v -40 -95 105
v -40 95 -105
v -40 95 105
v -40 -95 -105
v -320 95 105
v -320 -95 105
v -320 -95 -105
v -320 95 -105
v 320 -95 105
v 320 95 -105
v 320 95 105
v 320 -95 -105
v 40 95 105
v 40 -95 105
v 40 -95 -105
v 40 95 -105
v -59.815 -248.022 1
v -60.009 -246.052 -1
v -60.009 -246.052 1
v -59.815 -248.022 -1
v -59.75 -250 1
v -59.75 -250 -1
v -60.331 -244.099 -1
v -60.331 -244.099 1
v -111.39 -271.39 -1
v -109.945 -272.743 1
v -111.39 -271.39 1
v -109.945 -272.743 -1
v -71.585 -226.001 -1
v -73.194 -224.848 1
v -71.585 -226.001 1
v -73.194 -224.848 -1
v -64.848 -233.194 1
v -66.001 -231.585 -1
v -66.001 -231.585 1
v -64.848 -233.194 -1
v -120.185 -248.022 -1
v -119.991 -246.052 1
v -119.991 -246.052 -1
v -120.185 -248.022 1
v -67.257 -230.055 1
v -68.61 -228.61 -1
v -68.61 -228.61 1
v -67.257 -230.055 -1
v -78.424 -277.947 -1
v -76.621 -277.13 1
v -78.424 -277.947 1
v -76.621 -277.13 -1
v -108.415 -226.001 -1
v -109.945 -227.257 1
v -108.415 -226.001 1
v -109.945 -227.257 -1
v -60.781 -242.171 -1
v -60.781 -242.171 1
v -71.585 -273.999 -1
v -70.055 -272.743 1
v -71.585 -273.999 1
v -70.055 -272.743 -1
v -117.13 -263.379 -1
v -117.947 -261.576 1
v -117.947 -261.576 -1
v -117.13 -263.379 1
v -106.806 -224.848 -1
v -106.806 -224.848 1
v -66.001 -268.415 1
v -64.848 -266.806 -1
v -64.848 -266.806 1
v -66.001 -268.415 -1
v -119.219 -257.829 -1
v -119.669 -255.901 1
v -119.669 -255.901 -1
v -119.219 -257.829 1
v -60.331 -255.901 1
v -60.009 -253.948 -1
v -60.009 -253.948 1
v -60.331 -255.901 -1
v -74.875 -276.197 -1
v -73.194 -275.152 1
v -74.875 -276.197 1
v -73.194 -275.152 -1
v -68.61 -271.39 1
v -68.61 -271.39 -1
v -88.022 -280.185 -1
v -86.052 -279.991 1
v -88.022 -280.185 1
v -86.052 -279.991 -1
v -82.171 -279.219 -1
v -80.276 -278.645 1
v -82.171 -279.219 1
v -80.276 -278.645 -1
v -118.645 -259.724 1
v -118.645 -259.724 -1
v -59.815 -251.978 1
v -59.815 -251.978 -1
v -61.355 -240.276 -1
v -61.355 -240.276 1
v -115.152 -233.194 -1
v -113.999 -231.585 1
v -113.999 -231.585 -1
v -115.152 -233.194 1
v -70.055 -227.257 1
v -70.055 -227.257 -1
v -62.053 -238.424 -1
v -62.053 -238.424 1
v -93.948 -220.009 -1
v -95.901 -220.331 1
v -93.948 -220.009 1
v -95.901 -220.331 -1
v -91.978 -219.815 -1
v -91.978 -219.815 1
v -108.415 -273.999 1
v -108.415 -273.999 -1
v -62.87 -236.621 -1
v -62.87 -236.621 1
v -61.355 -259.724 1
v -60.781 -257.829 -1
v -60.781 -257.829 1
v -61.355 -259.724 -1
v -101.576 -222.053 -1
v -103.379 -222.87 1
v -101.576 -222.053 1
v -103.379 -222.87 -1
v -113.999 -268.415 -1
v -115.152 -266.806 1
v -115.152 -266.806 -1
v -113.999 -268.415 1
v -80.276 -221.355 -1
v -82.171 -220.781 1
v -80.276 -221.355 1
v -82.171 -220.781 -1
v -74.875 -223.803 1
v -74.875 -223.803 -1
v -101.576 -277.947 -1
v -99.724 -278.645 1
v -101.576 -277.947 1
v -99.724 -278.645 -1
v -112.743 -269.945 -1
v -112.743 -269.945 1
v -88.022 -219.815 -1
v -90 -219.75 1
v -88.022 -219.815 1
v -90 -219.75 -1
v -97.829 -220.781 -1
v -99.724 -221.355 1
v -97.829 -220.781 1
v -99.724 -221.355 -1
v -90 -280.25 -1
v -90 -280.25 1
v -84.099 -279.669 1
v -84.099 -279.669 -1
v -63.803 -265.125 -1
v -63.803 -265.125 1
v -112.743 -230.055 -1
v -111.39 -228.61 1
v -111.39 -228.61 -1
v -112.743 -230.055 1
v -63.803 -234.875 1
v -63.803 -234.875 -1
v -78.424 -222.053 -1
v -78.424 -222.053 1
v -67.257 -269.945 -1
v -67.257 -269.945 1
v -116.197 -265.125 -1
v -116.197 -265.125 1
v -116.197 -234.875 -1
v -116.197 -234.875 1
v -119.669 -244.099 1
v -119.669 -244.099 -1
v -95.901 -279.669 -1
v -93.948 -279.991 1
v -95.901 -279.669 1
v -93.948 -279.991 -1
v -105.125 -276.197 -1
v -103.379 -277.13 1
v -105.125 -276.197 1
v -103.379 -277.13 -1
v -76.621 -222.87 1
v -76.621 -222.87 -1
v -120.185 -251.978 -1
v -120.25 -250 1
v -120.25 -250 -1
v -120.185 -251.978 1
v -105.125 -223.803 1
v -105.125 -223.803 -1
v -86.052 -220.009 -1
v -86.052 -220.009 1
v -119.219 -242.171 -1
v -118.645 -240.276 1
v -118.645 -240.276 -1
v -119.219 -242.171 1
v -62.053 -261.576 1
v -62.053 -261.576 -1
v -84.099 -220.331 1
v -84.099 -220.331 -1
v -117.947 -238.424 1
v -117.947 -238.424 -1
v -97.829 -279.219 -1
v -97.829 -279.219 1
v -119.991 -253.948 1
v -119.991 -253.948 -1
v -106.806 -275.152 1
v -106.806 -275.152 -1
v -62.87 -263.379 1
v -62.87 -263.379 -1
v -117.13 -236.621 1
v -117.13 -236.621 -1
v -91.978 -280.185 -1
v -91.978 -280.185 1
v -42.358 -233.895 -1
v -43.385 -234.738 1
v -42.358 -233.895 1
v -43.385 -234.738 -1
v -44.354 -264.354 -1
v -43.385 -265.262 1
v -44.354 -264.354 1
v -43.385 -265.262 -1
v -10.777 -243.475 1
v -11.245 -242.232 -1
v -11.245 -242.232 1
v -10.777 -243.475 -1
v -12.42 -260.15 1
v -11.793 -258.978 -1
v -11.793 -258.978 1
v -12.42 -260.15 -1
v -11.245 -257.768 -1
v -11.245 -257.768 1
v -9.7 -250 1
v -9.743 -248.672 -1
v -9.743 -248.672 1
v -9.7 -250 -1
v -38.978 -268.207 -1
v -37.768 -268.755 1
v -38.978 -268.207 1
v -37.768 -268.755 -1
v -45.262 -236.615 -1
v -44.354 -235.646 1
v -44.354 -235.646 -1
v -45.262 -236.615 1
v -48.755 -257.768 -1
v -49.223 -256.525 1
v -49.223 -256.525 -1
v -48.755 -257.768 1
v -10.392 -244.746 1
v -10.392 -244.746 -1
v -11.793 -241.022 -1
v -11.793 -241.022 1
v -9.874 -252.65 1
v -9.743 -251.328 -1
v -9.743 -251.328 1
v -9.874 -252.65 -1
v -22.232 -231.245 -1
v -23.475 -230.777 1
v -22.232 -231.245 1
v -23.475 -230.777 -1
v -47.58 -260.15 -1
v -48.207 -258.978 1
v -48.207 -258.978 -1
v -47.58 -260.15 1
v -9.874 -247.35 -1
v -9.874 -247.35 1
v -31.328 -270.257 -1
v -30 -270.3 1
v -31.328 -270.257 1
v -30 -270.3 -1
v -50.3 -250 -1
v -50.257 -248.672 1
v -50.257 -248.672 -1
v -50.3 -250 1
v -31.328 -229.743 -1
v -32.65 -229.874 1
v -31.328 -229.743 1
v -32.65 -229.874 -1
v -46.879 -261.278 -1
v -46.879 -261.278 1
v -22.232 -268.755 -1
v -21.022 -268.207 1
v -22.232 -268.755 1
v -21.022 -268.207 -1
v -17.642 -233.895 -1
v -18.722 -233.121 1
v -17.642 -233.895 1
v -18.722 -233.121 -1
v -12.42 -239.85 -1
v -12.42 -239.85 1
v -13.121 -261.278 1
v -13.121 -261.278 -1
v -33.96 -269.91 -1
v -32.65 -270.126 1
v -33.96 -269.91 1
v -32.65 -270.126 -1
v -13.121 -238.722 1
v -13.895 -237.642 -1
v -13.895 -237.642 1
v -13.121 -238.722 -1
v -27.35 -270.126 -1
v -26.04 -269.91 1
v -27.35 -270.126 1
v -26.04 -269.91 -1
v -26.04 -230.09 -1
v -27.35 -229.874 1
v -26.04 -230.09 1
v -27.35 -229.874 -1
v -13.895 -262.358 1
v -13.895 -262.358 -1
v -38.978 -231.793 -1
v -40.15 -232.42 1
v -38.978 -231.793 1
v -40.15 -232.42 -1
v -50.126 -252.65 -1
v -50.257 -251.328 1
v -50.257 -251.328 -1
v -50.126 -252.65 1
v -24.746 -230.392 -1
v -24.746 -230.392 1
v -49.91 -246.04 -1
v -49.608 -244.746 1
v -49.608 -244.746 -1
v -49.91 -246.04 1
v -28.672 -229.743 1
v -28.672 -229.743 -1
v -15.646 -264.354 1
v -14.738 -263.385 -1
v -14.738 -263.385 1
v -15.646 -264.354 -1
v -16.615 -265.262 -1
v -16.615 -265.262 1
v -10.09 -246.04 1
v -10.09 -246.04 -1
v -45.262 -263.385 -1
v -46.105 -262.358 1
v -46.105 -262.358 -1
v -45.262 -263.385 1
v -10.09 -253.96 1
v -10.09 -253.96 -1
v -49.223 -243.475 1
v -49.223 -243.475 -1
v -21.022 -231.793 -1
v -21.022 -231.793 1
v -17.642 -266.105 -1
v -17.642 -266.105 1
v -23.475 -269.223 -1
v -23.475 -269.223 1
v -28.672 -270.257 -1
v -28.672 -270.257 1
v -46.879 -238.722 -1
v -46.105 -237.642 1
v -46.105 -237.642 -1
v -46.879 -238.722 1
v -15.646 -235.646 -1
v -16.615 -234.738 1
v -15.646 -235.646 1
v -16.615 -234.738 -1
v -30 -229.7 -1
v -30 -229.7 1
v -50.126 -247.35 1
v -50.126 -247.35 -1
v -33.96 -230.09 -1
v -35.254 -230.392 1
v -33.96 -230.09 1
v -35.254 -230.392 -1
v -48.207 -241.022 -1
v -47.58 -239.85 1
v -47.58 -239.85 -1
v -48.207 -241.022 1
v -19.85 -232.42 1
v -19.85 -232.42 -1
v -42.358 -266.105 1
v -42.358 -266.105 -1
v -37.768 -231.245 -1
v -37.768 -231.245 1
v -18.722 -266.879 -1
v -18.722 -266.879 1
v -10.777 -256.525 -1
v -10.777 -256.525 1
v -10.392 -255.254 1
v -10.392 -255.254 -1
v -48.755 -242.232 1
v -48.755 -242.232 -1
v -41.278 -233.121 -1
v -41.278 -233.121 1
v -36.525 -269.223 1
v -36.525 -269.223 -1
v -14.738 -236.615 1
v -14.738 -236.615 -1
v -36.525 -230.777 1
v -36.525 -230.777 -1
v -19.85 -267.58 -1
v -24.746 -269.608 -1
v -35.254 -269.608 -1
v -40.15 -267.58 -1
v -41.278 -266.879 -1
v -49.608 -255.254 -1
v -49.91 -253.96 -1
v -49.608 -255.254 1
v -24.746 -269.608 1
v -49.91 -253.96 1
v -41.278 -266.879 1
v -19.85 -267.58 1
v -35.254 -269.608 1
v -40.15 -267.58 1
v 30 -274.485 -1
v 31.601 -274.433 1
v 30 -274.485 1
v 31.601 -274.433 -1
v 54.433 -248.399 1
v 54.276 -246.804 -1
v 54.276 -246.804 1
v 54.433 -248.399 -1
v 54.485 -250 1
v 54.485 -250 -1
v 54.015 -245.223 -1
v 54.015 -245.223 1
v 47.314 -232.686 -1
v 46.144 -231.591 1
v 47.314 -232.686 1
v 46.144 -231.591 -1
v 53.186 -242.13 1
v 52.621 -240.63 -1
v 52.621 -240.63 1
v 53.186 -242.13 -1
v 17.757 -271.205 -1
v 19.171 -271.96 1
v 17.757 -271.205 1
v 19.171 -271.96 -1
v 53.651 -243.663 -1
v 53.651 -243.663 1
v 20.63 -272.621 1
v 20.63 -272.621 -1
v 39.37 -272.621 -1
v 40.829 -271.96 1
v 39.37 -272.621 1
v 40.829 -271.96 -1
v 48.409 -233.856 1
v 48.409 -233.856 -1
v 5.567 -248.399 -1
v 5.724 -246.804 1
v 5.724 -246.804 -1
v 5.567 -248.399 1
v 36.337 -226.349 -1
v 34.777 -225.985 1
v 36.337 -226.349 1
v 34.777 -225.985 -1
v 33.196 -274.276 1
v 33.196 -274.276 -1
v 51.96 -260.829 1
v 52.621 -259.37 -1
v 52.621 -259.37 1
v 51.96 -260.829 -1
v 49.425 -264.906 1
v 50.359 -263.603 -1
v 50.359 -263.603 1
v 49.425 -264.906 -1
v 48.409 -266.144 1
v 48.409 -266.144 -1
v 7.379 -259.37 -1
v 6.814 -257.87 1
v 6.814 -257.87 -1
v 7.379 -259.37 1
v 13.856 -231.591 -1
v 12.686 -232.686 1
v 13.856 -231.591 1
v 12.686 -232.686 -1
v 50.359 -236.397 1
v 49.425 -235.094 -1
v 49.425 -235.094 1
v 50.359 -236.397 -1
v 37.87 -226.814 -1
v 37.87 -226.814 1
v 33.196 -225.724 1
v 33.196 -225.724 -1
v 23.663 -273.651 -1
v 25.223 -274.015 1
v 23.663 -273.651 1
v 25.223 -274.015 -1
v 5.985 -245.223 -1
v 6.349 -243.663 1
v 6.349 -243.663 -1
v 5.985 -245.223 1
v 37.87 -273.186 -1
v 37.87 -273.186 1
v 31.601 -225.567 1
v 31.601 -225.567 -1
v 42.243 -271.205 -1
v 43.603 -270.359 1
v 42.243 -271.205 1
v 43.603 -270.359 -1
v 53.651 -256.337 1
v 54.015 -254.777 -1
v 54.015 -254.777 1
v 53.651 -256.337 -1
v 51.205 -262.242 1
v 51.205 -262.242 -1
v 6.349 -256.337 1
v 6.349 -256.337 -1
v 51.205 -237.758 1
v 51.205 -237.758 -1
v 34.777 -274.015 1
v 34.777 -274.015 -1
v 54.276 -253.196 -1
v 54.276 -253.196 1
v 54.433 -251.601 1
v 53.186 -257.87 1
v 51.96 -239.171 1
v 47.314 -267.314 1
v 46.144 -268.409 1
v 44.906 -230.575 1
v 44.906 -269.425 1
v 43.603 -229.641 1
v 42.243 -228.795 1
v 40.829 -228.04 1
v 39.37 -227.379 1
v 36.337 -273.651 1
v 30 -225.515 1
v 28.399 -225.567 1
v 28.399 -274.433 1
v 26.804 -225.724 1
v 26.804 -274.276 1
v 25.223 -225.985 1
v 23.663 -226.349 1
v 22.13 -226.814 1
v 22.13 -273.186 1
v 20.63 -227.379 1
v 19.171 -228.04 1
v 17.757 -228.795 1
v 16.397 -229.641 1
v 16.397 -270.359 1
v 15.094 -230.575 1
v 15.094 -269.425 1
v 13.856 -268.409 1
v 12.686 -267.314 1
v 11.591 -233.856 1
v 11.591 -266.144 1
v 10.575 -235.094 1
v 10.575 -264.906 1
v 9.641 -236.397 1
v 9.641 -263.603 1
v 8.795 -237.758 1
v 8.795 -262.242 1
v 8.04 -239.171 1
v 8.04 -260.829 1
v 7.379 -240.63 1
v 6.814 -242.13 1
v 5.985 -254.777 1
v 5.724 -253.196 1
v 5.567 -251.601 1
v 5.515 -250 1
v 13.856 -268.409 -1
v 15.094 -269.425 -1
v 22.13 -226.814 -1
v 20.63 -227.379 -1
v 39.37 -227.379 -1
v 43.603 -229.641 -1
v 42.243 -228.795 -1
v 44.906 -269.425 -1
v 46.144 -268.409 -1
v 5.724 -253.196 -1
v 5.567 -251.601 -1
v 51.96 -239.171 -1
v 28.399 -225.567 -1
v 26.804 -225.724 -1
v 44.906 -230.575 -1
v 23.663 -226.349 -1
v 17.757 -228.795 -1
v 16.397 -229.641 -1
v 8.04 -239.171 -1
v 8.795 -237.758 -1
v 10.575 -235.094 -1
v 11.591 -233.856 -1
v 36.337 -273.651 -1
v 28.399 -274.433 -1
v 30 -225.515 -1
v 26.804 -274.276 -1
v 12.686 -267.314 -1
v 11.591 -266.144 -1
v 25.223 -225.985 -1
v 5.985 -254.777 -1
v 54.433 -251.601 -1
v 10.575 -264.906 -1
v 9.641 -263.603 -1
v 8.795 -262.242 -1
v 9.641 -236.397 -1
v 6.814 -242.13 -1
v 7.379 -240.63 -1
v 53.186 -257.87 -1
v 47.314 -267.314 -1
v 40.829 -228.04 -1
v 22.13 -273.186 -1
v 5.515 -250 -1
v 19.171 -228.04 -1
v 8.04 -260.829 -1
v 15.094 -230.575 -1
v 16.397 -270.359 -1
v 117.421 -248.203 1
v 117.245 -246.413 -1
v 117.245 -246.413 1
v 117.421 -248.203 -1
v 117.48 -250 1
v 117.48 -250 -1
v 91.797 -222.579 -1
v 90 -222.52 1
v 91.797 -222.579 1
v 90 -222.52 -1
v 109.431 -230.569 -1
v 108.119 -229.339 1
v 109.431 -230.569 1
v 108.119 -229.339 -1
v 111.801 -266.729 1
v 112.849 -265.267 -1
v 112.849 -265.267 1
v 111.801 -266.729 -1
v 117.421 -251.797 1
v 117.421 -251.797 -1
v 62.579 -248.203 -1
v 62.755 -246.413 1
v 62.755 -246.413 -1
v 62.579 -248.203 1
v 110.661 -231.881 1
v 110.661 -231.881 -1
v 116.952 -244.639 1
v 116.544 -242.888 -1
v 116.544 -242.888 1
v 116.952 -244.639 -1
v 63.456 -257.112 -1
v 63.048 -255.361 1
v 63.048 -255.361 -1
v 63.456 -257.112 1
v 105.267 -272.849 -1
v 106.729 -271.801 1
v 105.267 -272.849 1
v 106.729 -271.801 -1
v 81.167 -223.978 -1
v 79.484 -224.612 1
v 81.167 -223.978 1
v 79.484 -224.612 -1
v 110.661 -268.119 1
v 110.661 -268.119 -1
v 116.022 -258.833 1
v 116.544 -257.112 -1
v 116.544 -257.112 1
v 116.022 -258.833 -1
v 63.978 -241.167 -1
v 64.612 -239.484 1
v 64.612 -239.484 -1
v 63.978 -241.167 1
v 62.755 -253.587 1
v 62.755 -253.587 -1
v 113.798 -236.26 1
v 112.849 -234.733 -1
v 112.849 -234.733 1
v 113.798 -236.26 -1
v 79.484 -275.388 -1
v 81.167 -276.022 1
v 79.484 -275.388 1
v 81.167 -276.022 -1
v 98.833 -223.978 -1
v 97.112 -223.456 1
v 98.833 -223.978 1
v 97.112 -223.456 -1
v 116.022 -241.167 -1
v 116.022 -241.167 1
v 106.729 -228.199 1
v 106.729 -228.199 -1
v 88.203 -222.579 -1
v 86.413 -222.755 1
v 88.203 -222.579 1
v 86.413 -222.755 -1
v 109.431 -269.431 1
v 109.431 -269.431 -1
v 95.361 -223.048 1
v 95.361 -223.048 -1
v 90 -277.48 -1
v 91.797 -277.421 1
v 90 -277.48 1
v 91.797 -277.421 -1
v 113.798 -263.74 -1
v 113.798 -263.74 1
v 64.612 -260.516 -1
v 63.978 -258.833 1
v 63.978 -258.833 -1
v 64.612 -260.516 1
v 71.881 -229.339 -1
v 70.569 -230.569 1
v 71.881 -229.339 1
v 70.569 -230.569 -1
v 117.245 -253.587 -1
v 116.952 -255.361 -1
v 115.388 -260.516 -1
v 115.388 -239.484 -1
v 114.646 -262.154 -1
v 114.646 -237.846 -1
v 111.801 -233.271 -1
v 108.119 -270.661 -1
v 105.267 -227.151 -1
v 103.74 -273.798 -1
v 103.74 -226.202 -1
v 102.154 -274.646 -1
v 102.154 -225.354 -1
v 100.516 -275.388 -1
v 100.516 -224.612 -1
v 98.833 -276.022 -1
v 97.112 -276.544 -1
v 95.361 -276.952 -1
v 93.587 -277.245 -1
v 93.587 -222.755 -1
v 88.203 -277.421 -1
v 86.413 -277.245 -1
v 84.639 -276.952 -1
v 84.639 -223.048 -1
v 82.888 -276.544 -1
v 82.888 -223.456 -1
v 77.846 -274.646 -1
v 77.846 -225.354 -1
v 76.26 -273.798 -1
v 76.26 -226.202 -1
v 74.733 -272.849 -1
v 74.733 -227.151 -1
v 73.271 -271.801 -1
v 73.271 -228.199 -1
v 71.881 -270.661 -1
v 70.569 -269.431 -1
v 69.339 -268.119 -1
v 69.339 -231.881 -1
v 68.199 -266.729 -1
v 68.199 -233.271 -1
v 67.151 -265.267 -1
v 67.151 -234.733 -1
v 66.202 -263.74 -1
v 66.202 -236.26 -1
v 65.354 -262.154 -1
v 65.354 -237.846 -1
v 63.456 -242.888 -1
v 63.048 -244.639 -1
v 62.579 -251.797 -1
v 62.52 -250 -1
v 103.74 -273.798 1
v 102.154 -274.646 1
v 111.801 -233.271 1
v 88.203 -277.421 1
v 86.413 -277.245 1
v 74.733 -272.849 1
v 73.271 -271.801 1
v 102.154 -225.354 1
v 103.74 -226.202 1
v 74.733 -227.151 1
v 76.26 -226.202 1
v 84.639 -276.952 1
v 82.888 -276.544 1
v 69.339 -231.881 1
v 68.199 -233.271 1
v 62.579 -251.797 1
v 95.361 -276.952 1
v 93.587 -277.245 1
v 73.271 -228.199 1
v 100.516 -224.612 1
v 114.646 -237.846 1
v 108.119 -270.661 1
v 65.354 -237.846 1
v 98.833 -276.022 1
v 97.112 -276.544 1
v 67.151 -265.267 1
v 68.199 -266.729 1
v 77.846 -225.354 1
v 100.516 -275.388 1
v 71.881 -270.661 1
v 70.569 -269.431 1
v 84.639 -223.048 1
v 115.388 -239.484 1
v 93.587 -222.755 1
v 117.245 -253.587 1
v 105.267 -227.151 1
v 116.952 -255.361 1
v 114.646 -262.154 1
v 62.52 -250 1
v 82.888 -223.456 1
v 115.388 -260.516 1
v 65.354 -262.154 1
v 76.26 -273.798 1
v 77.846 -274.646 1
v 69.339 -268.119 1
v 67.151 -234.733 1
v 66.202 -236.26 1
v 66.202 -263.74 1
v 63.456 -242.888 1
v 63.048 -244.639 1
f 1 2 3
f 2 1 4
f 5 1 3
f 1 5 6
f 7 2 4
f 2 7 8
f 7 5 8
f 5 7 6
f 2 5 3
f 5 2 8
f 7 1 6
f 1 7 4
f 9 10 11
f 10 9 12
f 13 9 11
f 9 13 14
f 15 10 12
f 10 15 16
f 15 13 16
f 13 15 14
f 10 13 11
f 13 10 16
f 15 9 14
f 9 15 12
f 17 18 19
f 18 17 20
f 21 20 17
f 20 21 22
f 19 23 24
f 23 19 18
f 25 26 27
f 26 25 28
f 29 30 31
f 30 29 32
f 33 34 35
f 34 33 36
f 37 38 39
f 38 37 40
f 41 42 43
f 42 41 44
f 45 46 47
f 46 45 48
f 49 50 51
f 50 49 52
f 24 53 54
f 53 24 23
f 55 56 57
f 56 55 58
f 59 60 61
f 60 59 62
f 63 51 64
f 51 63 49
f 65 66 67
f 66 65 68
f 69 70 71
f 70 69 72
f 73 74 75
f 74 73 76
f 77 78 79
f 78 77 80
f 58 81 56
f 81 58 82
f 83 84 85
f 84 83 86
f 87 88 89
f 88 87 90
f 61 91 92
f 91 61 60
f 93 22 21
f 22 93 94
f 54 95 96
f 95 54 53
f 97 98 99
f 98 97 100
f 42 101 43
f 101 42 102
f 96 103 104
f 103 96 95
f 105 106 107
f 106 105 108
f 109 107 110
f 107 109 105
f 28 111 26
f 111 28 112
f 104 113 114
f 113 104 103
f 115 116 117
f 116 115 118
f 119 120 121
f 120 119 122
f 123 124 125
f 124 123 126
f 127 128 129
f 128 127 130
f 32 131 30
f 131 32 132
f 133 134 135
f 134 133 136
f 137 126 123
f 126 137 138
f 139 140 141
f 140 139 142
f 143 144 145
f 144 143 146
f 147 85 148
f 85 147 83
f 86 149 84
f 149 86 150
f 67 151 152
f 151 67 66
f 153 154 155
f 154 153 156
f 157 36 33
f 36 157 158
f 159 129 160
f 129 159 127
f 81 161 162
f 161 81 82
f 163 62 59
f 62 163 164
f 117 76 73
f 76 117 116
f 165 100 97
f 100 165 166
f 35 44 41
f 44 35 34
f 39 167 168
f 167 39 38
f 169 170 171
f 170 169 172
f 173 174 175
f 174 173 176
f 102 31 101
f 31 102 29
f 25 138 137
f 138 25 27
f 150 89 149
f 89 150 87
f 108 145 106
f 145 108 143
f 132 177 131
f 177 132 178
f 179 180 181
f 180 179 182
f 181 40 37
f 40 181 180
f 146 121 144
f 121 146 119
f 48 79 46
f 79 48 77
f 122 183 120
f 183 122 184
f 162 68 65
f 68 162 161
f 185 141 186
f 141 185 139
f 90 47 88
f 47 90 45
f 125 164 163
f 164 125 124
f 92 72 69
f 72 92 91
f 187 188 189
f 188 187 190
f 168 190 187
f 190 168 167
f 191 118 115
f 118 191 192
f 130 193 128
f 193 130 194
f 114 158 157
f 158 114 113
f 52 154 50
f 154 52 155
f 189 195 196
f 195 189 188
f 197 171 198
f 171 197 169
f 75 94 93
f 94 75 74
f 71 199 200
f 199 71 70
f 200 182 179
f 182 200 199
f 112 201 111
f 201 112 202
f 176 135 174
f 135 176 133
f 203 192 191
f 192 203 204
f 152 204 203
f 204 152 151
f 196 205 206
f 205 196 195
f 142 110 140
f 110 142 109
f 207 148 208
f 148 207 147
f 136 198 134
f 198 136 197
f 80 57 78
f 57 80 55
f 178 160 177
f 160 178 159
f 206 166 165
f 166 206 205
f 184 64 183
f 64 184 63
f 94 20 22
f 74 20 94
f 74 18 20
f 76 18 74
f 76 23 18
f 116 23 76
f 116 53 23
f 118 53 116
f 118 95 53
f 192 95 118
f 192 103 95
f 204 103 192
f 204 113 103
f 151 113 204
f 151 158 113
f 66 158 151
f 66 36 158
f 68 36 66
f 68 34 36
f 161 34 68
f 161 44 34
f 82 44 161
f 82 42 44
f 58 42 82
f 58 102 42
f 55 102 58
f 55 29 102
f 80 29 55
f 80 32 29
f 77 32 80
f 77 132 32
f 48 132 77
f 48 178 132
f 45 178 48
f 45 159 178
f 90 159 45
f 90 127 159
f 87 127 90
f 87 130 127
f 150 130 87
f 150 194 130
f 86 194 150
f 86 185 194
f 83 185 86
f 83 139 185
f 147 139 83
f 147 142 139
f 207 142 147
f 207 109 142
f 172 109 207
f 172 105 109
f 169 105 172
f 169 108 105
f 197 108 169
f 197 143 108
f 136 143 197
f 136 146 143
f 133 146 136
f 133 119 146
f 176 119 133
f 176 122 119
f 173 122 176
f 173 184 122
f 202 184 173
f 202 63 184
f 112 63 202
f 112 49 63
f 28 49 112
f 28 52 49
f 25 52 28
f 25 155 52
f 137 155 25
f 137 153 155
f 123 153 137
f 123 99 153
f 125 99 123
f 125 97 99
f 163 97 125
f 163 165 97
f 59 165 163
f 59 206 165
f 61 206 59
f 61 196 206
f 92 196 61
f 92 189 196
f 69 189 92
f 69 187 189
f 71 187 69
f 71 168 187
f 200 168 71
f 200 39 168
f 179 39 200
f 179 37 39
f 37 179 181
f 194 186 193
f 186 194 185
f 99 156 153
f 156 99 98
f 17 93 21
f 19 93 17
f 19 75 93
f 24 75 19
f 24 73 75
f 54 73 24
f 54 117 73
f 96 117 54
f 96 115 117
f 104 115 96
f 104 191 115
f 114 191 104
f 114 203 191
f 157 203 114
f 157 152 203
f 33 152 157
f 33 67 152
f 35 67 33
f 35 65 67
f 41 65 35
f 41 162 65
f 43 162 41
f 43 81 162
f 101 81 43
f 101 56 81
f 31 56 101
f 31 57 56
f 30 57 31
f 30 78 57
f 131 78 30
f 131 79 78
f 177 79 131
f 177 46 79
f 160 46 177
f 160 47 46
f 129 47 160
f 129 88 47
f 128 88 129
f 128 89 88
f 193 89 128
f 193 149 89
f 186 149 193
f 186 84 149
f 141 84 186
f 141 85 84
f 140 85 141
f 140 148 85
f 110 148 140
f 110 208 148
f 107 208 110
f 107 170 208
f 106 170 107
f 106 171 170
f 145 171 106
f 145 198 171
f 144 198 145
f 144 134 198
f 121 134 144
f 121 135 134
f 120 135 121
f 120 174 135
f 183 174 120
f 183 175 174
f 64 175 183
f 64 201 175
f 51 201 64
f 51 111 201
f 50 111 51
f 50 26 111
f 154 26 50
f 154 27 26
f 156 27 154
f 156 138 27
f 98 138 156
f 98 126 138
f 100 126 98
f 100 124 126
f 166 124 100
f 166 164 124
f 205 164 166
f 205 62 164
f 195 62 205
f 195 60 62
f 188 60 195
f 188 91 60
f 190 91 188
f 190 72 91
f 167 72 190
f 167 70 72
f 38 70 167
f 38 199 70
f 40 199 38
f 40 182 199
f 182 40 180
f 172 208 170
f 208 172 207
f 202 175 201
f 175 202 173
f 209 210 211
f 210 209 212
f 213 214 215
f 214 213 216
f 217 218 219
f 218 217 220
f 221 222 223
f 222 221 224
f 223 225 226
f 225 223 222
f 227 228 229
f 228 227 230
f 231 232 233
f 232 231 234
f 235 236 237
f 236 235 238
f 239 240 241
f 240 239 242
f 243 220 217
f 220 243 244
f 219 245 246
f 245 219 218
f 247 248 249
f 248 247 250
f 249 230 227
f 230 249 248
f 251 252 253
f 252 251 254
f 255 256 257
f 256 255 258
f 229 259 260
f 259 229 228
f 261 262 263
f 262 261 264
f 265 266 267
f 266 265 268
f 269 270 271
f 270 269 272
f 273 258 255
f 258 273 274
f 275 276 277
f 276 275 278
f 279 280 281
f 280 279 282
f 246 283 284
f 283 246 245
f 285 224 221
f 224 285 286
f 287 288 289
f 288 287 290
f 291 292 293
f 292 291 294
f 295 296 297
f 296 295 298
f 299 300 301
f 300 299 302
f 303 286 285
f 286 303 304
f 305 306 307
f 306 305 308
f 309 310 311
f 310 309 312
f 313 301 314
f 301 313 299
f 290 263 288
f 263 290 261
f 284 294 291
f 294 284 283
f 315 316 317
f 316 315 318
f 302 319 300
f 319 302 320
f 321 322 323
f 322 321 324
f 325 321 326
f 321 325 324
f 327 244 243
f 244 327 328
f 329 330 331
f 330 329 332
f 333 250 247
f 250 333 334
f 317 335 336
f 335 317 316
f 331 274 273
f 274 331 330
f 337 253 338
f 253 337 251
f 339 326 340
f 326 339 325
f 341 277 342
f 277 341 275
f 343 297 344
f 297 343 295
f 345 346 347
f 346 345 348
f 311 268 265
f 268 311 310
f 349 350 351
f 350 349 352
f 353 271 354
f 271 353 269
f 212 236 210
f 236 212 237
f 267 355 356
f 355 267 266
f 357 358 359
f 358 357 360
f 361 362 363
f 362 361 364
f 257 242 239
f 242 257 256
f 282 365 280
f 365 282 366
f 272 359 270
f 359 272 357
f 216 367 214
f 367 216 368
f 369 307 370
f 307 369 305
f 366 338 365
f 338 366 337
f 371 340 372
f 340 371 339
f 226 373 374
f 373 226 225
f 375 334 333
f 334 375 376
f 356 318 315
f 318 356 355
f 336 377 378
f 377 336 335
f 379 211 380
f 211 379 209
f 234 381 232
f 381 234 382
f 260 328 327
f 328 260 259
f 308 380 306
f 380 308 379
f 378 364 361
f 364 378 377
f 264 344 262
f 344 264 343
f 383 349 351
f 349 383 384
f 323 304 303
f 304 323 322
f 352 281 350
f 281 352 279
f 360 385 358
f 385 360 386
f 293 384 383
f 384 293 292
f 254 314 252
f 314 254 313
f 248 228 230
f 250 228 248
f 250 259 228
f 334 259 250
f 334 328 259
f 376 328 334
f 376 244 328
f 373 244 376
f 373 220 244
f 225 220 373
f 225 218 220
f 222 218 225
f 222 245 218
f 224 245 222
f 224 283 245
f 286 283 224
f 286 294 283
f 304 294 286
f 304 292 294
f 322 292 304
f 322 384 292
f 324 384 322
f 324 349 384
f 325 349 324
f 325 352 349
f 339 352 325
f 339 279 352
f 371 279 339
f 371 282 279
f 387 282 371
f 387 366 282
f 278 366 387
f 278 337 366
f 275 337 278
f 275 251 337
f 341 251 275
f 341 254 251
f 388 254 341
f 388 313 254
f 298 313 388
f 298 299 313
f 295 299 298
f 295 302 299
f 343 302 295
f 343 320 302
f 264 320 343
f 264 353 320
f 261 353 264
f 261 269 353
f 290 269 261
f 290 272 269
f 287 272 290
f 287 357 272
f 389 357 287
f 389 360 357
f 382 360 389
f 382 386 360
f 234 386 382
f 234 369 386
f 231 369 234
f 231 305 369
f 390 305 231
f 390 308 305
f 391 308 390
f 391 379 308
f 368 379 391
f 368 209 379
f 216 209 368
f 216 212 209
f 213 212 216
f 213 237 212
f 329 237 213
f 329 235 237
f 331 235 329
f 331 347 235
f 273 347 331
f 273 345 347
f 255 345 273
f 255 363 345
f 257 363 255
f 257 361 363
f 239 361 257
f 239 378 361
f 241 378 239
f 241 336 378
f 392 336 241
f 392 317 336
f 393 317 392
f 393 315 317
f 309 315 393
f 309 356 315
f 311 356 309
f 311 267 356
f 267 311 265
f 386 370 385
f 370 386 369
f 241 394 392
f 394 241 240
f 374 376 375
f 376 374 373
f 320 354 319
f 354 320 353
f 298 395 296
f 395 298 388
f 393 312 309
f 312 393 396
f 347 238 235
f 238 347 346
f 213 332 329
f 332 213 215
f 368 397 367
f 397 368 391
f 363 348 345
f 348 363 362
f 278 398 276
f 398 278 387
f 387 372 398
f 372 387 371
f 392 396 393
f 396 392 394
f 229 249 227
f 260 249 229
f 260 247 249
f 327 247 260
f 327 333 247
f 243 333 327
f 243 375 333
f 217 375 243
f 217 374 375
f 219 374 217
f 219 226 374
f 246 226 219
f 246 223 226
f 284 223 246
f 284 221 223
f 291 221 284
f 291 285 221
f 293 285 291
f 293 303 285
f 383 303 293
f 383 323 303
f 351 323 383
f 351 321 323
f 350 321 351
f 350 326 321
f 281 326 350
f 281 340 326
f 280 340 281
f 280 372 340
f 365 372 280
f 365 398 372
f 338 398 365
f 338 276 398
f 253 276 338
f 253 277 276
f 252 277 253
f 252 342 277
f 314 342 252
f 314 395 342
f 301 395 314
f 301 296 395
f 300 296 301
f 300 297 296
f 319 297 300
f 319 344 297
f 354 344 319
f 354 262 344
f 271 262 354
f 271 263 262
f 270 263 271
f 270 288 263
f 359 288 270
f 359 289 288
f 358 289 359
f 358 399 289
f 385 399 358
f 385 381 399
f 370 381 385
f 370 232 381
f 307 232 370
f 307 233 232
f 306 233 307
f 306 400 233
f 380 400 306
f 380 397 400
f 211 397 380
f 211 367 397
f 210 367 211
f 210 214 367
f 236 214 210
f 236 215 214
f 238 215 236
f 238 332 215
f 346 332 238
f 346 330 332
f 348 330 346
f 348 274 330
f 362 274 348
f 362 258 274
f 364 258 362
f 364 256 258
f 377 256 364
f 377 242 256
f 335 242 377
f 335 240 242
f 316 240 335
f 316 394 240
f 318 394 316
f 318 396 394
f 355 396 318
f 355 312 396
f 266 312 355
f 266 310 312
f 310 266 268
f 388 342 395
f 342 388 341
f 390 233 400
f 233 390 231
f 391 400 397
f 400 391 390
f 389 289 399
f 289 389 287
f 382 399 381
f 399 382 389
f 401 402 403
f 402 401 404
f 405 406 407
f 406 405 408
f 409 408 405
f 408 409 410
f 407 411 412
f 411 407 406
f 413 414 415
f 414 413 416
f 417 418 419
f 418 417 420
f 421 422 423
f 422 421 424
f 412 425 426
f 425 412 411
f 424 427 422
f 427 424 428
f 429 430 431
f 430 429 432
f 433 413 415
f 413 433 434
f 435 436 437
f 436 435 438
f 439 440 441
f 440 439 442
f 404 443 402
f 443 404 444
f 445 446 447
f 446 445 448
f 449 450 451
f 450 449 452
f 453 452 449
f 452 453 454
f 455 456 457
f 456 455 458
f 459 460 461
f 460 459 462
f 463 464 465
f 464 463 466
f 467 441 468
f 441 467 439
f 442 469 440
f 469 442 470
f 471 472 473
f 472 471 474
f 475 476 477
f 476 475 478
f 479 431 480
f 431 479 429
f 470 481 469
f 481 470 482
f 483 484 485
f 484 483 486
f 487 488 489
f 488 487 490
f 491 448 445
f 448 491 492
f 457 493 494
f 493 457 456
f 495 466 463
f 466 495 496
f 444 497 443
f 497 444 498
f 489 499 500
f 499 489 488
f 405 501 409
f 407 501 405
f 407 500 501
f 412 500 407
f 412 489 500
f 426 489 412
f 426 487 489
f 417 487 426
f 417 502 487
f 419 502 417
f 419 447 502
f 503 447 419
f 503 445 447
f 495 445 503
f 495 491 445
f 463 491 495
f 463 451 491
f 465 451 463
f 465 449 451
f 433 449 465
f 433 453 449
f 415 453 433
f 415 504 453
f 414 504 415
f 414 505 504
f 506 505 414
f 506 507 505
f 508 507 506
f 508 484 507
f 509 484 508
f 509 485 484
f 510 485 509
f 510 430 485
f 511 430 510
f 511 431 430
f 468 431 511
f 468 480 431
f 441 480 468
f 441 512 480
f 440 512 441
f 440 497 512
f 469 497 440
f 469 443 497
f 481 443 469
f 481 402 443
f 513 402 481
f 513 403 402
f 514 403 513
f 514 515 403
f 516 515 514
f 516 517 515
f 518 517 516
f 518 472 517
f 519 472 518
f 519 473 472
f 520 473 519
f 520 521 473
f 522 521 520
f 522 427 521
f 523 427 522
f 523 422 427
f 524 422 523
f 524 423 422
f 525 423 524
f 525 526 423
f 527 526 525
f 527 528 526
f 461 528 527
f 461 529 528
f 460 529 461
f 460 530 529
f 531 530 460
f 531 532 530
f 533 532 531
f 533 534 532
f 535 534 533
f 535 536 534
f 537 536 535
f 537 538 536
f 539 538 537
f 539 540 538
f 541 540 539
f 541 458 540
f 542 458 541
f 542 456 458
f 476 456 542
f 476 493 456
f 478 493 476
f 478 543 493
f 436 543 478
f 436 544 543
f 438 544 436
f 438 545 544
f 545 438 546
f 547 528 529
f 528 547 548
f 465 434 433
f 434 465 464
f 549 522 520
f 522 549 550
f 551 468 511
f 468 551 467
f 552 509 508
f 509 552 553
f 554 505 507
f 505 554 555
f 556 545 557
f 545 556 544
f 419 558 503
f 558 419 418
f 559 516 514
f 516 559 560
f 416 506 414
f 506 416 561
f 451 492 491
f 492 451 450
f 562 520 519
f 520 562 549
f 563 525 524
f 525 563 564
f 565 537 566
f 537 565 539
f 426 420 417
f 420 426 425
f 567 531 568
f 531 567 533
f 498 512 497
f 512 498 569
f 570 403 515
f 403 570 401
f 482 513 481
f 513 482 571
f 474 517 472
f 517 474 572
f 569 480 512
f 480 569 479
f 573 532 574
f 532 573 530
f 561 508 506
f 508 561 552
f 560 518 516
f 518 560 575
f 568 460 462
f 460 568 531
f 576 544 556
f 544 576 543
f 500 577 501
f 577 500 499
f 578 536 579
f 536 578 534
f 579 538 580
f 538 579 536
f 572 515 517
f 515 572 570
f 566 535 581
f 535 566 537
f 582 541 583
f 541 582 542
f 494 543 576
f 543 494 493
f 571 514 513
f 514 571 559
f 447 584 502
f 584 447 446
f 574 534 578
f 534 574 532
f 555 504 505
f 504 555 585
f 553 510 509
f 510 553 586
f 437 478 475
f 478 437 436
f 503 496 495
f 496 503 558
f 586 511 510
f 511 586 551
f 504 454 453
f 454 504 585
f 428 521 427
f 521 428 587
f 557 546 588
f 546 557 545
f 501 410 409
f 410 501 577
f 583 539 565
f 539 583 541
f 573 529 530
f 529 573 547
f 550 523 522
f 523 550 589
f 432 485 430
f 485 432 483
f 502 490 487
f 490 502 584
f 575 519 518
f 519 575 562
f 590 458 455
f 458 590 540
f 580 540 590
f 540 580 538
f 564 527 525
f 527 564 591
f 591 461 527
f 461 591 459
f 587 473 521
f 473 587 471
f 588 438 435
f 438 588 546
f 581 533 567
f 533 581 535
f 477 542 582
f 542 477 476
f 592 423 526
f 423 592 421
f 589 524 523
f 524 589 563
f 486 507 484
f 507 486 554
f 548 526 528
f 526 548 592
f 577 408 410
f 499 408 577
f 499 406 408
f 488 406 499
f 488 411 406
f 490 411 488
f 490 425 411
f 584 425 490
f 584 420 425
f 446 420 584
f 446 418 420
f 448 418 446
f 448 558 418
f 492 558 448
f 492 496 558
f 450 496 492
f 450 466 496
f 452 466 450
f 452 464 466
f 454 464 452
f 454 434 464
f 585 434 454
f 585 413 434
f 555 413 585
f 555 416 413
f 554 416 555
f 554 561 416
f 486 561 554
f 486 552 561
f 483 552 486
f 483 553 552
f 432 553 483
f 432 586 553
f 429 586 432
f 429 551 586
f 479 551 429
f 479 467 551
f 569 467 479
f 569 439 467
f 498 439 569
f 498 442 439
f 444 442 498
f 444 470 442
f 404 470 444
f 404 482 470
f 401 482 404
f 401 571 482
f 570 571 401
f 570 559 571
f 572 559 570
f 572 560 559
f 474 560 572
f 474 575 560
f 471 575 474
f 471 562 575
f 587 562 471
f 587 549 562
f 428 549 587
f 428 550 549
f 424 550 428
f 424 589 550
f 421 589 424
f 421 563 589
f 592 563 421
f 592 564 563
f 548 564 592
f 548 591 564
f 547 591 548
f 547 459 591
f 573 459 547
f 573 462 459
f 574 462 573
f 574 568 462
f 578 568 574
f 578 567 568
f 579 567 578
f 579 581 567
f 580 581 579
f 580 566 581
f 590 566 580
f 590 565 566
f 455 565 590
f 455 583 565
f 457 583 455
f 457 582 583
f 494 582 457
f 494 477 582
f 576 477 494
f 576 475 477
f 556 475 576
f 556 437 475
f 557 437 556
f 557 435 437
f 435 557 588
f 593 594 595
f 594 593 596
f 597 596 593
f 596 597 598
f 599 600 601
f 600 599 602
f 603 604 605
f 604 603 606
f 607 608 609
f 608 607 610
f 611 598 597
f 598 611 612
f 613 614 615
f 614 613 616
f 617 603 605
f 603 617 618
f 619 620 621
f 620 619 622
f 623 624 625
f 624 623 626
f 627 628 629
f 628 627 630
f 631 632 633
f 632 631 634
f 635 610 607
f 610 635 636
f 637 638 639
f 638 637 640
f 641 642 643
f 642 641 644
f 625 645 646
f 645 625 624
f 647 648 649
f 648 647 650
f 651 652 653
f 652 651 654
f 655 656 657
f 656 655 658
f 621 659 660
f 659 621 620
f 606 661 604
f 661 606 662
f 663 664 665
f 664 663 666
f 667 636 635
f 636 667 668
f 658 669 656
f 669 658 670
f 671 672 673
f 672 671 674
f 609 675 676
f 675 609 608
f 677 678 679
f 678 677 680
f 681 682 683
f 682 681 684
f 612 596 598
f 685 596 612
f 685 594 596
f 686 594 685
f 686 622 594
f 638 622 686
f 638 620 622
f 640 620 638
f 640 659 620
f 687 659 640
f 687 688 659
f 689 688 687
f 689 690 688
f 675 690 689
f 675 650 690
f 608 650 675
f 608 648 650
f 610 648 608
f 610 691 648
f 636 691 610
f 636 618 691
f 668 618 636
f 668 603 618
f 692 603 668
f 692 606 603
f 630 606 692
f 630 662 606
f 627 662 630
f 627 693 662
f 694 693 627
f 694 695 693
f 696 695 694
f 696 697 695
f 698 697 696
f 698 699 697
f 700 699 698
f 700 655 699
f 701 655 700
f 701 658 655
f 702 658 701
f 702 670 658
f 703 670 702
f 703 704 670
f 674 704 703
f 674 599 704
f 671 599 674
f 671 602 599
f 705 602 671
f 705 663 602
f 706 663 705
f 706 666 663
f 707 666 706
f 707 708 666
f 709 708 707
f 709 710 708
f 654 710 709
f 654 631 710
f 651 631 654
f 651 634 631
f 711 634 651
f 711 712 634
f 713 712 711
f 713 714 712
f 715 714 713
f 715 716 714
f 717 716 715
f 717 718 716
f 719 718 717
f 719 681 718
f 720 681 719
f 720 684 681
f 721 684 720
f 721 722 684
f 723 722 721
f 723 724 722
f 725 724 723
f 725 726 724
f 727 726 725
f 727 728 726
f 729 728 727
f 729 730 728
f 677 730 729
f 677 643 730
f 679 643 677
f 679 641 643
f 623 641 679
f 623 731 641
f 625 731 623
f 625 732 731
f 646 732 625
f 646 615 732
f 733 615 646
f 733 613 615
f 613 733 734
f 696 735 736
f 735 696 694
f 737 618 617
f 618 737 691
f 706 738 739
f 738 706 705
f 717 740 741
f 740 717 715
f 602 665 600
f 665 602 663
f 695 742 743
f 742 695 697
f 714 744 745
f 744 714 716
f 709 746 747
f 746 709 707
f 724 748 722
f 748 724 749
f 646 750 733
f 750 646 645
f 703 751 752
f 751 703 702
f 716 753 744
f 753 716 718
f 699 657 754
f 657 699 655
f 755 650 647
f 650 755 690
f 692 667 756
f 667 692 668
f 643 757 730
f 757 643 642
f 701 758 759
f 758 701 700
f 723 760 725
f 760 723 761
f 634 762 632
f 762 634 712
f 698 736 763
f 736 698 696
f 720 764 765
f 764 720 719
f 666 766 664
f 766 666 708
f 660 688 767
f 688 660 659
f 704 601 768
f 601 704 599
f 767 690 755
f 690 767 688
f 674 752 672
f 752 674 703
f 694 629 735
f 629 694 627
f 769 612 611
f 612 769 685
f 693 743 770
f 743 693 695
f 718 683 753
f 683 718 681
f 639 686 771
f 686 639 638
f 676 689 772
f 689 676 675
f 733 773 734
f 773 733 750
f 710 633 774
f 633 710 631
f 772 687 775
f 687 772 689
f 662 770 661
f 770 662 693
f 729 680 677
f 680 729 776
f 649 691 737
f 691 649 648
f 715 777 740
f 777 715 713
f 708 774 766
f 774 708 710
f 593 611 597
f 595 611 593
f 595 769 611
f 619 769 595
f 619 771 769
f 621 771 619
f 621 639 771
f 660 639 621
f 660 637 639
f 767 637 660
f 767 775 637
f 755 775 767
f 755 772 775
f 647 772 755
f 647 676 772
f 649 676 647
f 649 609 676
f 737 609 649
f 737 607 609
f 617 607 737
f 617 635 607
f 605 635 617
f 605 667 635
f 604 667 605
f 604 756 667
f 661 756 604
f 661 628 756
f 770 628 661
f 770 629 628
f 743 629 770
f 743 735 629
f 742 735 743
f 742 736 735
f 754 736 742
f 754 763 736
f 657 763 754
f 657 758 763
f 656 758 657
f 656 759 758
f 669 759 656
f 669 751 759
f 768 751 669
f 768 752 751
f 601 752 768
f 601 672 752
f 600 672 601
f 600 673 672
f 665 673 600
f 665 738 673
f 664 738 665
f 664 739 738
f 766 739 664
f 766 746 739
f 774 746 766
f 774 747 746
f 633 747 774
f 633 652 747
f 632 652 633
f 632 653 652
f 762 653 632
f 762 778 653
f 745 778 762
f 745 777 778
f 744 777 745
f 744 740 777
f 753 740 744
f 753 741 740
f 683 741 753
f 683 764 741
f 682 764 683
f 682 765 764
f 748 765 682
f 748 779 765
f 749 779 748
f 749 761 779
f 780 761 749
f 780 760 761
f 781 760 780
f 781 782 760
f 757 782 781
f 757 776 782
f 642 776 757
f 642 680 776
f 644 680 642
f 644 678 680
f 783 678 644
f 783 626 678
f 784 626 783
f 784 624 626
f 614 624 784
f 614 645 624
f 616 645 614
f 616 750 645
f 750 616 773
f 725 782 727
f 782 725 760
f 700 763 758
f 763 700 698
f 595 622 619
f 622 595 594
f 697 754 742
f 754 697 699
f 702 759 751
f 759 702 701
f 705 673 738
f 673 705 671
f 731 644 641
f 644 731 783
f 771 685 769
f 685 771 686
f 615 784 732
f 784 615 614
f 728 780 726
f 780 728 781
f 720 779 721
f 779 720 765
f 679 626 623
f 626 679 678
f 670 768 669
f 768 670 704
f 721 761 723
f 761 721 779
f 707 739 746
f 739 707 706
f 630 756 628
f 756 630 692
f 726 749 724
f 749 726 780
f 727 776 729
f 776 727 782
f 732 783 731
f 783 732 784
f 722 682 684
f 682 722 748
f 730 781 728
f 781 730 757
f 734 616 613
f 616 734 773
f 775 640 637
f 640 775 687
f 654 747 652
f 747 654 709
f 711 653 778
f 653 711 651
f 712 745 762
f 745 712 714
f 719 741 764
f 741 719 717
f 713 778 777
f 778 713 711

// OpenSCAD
// PET-linked K16 F1 guides; not OEM, interface, aero or manufacturing geometry.
// Boxes are complete-unit supplier envelopes; diameter coupons are spatially unrelated.
$fn = 96;
envelope_mm = [280.000000, 190.000000, 210.000000];
coupon_thickness_mm = 2.000000; // visualization hypothesis only

module complete_unit_envelope() {
    cube(envelope_mm, center = true);
}

module diameter_coupon(diameter_mm) {
    cylinder(h = coupon_thickness_mm, d = diameter_mm, center = true);
}

// Left and right display offsets are not vehicle coordinates.
translate([-180.000000, 0, 0]) complete_unit_envelope();
translate([180.000000, 0, 0]) complete_unit_envelope();

// Right-side catalogue diameter coupons; never positioned inside either turbo.
// compressor_exducer: supplier-declared diameter
translate([-90.000000, -250.000000, 0]) 
    diameter_coupon(60.500000);
// compressor_inducer: supplier-declared diameter
translate([-30.000000, -250.000000, 0]) 
    diameter_coupon(40.600000);
// turbine_exducer: supplier-declared diameter
translate([30.000000, -250.000000, 0]) 
    diameter_coupon(48.970000);
// turbine_inducer: supplier-declared diameter
translate([90.000000, -250.000000, 0]) 
    diameter_coupon(54.960000);
